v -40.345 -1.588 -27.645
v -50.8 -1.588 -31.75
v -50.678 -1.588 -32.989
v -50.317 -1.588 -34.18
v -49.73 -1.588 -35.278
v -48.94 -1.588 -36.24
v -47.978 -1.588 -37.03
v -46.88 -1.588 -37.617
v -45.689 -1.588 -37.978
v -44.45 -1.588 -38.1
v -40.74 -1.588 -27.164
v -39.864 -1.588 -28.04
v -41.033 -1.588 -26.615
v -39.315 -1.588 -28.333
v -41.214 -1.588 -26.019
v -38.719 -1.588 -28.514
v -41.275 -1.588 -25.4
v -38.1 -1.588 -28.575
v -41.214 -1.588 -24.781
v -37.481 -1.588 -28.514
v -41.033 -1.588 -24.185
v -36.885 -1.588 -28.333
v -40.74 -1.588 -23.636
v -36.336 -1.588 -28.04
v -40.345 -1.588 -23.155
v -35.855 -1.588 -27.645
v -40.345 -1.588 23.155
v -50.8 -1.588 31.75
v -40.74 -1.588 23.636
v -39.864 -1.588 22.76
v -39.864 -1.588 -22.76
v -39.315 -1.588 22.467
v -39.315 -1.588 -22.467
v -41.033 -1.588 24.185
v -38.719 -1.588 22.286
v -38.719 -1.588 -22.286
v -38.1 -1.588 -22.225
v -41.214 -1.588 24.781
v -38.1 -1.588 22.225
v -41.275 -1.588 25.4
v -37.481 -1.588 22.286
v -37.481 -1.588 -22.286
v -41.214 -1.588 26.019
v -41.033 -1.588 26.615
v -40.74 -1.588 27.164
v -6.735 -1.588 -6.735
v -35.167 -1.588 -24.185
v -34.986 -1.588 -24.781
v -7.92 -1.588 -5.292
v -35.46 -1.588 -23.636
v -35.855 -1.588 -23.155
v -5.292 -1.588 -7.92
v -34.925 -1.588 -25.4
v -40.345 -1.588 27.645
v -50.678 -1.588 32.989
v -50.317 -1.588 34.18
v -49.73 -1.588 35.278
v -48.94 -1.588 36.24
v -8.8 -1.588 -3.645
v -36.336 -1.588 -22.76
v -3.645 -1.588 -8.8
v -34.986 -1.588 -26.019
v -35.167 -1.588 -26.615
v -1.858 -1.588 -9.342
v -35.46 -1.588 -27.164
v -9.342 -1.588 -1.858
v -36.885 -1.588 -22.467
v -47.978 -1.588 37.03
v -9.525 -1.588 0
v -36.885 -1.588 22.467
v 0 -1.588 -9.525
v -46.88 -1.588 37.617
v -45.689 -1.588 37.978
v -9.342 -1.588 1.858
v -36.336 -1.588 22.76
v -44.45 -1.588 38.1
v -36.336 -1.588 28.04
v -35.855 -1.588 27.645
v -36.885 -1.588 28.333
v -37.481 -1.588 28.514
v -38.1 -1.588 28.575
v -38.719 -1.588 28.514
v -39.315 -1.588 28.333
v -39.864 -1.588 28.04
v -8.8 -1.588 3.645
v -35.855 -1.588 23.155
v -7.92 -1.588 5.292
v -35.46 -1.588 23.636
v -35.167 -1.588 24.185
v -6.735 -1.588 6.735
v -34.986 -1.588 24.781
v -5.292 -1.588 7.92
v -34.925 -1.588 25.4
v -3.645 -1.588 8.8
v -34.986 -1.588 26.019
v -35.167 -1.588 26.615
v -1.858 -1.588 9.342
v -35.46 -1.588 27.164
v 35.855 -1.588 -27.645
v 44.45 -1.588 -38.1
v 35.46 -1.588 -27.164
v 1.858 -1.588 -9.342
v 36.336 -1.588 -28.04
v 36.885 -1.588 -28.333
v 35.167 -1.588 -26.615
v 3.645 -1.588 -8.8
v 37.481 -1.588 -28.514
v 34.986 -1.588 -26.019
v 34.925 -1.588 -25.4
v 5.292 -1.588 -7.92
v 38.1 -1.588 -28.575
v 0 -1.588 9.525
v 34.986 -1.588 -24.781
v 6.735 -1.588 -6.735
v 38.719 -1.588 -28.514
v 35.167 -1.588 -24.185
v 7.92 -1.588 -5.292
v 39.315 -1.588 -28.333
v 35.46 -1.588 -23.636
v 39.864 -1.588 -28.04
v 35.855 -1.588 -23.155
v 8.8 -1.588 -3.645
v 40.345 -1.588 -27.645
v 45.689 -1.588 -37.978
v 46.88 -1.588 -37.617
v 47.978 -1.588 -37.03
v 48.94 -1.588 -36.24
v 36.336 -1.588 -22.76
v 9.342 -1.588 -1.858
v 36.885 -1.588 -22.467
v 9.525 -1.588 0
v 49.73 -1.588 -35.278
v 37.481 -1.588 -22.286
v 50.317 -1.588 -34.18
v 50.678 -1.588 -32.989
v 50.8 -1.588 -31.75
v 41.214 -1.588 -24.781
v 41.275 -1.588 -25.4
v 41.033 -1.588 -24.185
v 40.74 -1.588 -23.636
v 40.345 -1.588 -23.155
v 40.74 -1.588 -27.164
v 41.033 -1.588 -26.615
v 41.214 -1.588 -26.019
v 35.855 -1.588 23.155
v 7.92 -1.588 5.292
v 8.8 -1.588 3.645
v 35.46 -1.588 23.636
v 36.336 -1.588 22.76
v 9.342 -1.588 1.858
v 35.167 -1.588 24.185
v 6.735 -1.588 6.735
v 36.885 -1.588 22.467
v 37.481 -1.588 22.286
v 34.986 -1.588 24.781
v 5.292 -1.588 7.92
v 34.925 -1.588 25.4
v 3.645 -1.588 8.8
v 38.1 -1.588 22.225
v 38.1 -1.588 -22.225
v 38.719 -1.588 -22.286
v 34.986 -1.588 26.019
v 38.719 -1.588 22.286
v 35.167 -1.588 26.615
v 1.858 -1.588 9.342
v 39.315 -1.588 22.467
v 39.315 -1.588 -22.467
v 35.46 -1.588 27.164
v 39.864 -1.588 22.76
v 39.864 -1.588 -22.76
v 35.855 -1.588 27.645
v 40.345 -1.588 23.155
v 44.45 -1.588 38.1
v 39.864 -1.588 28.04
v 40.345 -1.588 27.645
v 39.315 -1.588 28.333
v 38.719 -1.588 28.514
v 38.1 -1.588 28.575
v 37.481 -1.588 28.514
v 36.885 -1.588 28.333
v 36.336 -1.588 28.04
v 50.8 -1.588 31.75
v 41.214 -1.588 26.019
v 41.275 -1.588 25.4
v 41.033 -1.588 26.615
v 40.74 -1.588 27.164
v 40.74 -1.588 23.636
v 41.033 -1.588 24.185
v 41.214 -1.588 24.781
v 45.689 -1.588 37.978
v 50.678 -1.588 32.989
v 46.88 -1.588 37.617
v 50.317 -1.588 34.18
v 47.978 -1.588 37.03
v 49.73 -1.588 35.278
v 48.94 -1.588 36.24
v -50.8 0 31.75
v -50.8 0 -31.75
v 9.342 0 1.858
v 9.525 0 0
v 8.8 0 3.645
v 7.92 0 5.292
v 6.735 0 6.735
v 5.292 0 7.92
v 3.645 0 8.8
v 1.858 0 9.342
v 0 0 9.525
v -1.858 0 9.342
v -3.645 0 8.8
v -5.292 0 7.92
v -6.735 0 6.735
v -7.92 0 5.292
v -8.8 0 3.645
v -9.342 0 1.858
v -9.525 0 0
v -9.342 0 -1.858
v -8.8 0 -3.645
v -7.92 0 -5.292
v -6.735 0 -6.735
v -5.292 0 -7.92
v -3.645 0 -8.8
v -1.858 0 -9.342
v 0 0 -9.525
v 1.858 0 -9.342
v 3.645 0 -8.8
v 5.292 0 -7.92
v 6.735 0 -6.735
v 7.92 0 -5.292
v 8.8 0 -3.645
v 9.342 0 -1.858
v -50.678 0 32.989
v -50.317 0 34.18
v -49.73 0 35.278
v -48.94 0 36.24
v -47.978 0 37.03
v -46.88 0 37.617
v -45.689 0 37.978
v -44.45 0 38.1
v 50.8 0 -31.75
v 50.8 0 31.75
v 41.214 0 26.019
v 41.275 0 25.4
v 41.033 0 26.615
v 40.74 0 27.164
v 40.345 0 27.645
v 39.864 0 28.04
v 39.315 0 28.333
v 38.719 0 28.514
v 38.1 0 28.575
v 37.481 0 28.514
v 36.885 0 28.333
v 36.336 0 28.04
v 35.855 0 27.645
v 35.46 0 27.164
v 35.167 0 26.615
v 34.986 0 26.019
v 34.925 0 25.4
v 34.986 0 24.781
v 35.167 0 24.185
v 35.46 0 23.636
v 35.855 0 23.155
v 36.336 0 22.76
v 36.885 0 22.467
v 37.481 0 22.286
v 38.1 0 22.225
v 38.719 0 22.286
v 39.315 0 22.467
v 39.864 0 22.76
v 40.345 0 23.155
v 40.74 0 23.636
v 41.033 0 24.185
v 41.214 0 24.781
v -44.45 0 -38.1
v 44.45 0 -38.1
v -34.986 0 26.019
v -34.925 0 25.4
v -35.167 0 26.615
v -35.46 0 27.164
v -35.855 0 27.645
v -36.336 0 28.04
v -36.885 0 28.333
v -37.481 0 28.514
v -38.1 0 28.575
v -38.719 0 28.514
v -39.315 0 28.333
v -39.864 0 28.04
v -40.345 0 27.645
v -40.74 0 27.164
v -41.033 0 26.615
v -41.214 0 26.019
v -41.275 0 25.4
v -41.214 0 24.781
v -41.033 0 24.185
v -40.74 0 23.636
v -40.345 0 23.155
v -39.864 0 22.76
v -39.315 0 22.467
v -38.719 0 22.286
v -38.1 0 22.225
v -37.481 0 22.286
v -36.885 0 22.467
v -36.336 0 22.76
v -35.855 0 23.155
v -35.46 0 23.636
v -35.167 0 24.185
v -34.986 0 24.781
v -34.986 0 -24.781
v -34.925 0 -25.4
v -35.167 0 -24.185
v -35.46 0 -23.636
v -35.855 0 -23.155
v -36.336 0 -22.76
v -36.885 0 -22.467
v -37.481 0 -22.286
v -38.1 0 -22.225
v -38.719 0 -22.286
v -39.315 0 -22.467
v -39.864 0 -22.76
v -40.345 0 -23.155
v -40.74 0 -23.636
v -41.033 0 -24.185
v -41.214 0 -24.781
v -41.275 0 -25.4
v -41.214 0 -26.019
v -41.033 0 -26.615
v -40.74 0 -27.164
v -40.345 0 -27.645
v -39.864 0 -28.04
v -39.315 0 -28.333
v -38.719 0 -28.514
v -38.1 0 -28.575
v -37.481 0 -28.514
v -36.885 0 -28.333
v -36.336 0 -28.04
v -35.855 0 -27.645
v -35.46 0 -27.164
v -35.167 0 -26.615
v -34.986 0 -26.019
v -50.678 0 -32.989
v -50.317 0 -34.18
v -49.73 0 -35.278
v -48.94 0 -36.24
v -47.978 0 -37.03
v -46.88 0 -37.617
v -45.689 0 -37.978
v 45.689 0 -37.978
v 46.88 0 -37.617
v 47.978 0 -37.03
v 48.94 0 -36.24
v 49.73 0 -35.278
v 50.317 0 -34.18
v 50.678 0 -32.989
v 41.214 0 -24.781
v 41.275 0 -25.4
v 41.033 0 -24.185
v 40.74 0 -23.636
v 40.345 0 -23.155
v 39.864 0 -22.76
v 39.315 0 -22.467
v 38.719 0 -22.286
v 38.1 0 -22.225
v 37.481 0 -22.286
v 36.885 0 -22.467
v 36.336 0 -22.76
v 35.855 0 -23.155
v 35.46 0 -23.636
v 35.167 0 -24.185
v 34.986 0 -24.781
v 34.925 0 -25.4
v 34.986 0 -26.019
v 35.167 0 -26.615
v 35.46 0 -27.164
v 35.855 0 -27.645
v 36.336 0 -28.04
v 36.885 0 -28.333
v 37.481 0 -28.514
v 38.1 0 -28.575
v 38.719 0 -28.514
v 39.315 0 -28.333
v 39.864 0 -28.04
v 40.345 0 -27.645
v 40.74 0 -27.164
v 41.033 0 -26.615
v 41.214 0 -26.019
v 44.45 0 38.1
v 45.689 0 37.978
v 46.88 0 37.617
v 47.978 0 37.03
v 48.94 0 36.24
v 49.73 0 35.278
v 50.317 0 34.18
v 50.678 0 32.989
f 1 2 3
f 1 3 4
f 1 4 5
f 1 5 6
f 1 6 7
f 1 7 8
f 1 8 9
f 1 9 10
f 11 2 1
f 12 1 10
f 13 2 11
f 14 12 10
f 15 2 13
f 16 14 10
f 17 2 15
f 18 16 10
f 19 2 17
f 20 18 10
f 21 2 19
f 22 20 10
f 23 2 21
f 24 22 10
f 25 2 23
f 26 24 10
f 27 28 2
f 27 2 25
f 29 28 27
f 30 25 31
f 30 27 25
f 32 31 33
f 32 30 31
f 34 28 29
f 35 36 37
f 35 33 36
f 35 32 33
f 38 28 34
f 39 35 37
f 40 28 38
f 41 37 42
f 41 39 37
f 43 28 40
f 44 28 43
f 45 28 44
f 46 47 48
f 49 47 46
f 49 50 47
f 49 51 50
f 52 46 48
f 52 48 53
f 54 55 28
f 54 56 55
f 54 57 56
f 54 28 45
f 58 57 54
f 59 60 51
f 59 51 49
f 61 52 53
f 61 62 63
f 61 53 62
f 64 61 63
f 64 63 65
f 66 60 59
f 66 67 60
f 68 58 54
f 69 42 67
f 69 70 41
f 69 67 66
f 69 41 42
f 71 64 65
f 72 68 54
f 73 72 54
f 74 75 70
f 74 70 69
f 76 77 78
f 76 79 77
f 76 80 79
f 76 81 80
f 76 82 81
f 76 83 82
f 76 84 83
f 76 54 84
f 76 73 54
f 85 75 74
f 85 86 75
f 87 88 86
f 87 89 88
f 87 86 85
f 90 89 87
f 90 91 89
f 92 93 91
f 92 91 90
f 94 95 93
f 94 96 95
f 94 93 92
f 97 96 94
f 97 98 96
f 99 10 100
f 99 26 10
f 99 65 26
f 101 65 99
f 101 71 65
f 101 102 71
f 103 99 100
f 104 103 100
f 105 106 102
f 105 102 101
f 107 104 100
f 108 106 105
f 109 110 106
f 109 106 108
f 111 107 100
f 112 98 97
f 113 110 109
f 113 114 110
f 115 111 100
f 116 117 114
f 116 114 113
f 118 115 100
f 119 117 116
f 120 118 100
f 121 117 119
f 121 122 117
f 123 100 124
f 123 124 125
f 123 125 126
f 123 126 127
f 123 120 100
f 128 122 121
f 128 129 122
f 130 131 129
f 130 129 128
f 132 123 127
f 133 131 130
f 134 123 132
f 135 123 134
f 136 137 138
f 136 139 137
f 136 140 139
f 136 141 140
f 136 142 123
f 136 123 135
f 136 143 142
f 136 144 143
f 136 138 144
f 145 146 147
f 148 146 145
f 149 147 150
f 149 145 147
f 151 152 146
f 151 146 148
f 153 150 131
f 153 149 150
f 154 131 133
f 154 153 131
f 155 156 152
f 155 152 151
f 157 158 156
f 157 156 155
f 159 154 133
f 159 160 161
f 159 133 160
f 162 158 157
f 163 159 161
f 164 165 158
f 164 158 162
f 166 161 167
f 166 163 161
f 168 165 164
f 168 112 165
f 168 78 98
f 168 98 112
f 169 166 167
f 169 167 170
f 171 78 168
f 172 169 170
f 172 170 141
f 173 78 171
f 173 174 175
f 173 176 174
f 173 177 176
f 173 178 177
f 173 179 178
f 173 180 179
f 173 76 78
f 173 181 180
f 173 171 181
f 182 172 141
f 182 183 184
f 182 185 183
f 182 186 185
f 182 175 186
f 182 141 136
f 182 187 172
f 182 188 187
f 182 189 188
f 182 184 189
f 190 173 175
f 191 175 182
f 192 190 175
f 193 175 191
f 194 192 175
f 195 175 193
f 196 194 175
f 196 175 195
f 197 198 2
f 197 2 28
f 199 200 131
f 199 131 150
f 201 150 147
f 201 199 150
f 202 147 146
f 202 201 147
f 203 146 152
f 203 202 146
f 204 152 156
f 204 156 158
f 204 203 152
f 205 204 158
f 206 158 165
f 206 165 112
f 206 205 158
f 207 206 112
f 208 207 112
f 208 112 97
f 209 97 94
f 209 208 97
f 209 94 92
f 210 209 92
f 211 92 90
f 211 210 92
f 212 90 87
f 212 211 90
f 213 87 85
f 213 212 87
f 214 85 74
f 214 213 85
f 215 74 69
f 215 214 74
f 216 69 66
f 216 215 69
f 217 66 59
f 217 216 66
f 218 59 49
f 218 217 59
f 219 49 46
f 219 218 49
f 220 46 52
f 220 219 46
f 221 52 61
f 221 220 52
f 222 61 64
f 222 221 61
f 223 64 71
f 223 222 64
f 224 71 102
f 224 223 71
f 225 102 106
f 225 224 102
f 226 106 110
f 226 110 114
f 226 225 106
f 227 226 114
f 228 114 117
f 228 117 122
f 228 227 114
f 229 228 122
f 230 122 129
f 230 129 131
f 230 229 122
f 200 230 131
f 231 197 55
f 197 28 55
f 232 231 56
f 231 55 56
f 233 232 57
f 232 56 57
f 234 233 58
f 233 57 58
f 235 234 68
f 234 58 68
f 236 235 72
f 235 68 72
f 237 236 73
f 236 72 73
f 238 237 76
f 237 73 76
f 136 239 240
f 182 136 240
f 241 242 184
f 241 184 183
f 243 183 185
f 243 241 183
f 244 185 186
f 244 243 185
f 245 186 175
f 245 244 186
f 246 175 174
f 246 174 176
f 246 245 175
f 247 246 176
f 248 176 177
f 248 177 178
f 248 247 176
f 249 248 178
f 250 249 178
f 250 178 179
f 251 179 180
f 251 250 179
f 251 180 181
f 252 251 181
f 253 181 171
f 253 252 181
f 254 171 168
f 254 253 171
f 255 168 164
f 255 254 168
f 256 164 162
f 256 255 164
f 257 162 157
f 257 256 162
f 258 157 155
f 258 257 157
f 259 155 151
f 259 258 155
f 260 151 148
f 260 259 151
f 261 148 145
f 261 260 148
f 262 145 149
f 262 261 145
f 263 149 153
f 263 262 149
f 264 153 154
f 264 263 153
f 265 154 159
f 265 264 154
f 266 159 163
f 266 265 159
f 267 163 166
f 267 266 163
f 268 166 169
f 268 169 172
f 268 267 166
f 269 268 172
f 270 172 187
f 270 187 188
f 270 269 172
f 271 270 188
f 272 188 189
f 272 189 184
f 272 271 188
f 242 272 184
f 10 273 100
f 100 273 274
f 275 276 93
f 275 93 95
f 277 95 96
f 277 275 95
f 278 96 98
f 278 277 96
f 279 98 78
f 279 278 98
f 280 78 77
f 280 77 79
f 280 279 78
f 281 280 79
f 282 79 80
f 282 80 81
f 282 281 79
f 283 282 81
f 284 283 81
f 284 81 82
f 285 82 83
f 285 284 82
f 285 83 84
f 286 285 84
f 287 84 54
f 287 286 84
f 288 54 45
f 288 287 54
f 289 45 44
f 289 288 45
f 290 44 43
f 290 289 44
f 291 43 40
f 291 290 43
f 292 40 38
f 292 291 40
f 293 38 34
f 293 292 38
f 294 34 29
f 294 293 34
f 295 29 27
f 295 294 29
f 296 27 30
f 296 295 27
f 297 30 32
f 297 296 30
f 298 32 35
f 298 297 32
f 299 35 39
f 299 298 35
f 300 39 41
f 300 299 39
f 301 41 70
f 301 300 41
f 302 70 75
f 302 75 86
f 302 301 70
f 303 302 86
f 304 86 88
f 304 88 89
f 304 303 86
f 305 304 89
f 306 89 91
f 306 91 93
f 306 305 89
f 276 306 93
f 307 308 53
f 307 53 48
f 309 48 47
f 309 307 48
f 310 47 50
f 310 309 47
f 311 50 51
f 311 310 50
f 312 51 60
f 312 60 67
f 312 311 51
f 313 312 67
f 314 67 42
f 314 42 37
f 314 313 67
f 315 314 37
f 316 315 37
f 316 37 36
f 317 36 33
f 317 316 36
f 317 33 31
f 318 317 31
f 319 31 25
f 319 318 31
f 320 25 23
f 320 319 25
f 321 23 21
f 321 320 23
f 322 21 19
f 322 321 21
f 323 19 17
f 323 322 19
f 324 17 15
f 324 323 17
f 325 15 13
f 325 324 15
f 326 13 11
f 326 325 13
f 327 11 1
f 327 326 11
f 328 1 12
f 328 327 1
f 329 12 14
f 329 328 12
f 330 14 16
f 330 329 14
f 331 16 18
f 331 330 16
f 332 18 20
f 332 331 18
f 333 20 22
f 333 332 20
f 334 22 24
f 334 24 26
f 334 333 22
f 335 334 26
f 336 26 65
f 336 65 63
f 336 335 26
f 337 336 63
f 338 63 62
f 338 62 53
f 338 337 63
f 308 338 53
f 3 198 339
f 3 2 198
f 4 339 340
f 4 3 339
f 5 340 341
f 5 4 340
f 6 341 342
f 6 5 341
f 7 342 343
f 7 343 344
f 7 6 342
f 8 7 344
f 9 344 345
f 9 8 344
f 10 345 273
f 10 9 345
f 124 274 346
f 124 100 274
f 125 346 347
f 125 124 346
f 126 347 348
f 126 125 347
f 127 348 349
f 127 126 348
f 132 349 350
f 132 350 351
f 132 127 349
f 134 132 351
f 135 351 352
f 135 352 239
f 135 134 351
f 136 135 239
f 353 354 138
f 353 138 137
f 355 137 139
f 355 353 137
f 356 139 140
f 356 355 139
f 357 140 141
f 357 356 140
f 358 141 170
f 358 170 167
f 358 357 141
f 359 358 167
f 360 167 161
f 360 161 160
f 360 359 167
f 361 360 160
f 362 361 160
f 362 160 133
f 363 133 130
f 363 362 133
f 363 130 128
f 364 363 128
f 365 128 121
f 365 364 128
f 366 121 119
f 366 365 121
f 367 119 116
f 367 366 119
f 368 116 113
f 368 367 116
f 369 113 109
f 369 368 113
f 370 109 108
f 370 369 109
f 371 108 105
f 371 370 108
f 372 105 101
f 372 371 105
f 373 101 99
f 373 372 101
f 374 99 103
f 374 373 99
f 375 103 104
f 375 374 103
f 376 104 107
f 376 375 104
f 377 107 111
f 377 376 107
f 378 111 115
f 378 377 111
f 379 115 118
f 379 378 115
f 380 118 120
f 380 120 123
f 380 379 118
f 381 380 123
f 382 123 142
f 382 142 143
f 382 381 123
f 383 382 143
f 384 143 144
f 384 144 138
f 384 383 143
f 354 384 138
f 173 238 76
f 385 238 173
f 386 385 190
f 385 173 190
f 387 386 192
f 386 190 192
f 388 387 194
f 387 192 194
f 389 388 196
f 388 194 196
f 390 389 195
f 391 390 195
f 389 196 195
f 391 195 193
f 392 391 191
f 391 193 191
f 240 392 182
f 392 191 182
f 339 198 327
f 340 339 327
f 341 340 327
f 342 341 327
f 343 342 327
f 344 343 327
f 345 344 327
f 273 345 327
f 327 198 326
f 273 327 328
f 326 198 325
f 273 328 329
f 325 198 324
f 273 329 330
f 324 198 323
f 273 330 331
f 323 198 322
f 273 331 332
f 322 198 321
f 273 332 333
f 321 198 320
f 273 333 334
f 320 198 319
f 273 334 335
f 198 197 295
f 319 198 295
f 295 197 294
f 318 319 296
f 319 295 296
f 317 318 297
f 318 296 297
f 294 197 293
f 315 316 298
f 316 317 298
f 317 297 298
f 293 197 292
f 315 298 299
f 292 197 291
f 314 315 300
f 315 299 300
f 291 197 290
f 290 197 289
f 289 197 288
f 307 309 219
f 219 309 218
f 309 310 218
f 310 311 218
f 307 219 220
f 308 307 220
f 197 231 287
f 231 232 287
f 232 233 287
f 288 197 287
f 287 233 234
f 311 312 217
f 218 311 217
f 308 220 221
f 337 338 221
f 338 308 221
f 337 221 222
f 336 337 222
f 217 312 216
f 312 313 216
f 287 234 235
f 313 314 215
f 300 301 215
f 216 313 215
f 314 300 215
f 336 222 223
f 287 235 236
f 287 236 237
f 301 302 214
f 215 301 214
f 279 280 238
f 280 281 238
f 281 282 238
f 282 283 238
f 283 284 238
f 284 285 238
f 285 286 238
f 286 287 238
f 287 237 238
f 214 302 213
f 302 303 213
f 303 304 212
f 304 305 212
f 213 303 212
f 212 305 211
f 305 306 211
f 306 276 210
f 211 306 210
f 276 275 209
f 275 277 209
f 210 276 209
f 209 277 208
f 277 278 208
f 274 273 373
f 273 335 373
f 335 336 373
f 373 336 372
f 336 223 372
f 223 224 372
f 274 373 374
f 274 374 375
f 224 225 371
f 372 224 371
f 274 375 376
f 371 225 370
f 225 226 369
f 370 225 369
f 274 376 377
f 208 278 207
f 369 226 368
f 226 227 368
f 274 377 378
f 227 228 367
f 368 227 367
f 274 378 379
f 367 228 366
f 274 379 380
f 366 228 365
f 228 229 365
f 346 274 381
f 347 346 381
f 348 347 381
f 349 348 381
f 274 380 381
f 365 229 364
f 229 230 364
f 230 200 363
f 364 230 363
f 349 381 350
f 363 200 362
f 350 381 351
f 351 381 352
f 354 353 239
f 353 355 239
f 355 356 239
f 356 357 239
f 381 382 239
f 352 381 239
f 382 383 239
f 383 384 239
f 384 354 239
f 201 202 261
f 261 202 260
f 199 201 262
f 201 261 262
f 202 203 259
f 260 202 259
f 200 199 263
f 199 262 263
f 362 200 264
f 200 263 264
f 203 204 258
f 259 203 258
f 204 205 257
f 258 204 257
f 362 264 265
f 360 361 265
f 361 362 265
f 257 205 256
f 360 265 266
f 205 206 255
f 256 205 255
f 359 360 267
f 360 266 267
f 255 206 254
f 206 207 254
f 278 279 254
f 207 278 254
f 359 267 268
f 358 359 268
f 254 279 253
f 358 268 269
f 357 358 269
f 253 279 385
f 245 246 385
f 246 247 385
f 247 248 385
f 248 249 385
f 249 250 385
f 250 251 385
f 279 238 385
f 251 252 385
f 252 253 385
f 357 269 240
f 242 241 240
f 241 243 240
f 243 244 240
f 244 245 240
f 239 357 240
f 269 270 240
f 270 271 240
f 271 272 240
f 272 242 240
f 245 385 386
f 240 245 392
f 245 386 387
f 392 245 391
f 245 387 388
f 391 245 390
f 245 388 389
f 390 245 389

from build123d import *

# Parameters (mm, degrees)
F0_W     = 101.6
F0_H     = 76.2
F0_R     = 3.175
F0_R_2   = 9.525
F1_DEPTH = 1.5875
F2_R     = 6.35


with BuildPart() as f1:
    # F0 (on Front) → F1 (new body)
    with BuildSketch(Plane.XZ):
        Rectangle(F0_W, F0_H)
        with Locations((-38.1, -25.4)):
            Circle(F0_R, mode=Mode.SUBTRACT)
        with Locations((38.1, -25.4)):
            Circle(F0_R, mode=Mode.SUBTRACT)
        Circle(F0_R_2, mode=Mode.SUBTRACT)
        with Locations((-38.1, 25.4)):
            Circle(F0_R, mode=Mode.SUBTRACT)
        with Locations((38.1, 25.4)):
            Circle(F0_R, mode=Mode.SUBTRACT)
    extrude(amount=F1_DEPTH)

    # F2
    f2_edges = [f1.edges().sort_by_distance(p)[0] for p in [
        (50.8, -0.79375, 38.1),
        (50.8, -0.79375, -38.1),
        (-50.8, -0.79375, -38.1),
        (-50.8, -0.79375, 38.1),
    ]]
    fillet(f2_edges, radius=F2_R)


solid = f1.part
